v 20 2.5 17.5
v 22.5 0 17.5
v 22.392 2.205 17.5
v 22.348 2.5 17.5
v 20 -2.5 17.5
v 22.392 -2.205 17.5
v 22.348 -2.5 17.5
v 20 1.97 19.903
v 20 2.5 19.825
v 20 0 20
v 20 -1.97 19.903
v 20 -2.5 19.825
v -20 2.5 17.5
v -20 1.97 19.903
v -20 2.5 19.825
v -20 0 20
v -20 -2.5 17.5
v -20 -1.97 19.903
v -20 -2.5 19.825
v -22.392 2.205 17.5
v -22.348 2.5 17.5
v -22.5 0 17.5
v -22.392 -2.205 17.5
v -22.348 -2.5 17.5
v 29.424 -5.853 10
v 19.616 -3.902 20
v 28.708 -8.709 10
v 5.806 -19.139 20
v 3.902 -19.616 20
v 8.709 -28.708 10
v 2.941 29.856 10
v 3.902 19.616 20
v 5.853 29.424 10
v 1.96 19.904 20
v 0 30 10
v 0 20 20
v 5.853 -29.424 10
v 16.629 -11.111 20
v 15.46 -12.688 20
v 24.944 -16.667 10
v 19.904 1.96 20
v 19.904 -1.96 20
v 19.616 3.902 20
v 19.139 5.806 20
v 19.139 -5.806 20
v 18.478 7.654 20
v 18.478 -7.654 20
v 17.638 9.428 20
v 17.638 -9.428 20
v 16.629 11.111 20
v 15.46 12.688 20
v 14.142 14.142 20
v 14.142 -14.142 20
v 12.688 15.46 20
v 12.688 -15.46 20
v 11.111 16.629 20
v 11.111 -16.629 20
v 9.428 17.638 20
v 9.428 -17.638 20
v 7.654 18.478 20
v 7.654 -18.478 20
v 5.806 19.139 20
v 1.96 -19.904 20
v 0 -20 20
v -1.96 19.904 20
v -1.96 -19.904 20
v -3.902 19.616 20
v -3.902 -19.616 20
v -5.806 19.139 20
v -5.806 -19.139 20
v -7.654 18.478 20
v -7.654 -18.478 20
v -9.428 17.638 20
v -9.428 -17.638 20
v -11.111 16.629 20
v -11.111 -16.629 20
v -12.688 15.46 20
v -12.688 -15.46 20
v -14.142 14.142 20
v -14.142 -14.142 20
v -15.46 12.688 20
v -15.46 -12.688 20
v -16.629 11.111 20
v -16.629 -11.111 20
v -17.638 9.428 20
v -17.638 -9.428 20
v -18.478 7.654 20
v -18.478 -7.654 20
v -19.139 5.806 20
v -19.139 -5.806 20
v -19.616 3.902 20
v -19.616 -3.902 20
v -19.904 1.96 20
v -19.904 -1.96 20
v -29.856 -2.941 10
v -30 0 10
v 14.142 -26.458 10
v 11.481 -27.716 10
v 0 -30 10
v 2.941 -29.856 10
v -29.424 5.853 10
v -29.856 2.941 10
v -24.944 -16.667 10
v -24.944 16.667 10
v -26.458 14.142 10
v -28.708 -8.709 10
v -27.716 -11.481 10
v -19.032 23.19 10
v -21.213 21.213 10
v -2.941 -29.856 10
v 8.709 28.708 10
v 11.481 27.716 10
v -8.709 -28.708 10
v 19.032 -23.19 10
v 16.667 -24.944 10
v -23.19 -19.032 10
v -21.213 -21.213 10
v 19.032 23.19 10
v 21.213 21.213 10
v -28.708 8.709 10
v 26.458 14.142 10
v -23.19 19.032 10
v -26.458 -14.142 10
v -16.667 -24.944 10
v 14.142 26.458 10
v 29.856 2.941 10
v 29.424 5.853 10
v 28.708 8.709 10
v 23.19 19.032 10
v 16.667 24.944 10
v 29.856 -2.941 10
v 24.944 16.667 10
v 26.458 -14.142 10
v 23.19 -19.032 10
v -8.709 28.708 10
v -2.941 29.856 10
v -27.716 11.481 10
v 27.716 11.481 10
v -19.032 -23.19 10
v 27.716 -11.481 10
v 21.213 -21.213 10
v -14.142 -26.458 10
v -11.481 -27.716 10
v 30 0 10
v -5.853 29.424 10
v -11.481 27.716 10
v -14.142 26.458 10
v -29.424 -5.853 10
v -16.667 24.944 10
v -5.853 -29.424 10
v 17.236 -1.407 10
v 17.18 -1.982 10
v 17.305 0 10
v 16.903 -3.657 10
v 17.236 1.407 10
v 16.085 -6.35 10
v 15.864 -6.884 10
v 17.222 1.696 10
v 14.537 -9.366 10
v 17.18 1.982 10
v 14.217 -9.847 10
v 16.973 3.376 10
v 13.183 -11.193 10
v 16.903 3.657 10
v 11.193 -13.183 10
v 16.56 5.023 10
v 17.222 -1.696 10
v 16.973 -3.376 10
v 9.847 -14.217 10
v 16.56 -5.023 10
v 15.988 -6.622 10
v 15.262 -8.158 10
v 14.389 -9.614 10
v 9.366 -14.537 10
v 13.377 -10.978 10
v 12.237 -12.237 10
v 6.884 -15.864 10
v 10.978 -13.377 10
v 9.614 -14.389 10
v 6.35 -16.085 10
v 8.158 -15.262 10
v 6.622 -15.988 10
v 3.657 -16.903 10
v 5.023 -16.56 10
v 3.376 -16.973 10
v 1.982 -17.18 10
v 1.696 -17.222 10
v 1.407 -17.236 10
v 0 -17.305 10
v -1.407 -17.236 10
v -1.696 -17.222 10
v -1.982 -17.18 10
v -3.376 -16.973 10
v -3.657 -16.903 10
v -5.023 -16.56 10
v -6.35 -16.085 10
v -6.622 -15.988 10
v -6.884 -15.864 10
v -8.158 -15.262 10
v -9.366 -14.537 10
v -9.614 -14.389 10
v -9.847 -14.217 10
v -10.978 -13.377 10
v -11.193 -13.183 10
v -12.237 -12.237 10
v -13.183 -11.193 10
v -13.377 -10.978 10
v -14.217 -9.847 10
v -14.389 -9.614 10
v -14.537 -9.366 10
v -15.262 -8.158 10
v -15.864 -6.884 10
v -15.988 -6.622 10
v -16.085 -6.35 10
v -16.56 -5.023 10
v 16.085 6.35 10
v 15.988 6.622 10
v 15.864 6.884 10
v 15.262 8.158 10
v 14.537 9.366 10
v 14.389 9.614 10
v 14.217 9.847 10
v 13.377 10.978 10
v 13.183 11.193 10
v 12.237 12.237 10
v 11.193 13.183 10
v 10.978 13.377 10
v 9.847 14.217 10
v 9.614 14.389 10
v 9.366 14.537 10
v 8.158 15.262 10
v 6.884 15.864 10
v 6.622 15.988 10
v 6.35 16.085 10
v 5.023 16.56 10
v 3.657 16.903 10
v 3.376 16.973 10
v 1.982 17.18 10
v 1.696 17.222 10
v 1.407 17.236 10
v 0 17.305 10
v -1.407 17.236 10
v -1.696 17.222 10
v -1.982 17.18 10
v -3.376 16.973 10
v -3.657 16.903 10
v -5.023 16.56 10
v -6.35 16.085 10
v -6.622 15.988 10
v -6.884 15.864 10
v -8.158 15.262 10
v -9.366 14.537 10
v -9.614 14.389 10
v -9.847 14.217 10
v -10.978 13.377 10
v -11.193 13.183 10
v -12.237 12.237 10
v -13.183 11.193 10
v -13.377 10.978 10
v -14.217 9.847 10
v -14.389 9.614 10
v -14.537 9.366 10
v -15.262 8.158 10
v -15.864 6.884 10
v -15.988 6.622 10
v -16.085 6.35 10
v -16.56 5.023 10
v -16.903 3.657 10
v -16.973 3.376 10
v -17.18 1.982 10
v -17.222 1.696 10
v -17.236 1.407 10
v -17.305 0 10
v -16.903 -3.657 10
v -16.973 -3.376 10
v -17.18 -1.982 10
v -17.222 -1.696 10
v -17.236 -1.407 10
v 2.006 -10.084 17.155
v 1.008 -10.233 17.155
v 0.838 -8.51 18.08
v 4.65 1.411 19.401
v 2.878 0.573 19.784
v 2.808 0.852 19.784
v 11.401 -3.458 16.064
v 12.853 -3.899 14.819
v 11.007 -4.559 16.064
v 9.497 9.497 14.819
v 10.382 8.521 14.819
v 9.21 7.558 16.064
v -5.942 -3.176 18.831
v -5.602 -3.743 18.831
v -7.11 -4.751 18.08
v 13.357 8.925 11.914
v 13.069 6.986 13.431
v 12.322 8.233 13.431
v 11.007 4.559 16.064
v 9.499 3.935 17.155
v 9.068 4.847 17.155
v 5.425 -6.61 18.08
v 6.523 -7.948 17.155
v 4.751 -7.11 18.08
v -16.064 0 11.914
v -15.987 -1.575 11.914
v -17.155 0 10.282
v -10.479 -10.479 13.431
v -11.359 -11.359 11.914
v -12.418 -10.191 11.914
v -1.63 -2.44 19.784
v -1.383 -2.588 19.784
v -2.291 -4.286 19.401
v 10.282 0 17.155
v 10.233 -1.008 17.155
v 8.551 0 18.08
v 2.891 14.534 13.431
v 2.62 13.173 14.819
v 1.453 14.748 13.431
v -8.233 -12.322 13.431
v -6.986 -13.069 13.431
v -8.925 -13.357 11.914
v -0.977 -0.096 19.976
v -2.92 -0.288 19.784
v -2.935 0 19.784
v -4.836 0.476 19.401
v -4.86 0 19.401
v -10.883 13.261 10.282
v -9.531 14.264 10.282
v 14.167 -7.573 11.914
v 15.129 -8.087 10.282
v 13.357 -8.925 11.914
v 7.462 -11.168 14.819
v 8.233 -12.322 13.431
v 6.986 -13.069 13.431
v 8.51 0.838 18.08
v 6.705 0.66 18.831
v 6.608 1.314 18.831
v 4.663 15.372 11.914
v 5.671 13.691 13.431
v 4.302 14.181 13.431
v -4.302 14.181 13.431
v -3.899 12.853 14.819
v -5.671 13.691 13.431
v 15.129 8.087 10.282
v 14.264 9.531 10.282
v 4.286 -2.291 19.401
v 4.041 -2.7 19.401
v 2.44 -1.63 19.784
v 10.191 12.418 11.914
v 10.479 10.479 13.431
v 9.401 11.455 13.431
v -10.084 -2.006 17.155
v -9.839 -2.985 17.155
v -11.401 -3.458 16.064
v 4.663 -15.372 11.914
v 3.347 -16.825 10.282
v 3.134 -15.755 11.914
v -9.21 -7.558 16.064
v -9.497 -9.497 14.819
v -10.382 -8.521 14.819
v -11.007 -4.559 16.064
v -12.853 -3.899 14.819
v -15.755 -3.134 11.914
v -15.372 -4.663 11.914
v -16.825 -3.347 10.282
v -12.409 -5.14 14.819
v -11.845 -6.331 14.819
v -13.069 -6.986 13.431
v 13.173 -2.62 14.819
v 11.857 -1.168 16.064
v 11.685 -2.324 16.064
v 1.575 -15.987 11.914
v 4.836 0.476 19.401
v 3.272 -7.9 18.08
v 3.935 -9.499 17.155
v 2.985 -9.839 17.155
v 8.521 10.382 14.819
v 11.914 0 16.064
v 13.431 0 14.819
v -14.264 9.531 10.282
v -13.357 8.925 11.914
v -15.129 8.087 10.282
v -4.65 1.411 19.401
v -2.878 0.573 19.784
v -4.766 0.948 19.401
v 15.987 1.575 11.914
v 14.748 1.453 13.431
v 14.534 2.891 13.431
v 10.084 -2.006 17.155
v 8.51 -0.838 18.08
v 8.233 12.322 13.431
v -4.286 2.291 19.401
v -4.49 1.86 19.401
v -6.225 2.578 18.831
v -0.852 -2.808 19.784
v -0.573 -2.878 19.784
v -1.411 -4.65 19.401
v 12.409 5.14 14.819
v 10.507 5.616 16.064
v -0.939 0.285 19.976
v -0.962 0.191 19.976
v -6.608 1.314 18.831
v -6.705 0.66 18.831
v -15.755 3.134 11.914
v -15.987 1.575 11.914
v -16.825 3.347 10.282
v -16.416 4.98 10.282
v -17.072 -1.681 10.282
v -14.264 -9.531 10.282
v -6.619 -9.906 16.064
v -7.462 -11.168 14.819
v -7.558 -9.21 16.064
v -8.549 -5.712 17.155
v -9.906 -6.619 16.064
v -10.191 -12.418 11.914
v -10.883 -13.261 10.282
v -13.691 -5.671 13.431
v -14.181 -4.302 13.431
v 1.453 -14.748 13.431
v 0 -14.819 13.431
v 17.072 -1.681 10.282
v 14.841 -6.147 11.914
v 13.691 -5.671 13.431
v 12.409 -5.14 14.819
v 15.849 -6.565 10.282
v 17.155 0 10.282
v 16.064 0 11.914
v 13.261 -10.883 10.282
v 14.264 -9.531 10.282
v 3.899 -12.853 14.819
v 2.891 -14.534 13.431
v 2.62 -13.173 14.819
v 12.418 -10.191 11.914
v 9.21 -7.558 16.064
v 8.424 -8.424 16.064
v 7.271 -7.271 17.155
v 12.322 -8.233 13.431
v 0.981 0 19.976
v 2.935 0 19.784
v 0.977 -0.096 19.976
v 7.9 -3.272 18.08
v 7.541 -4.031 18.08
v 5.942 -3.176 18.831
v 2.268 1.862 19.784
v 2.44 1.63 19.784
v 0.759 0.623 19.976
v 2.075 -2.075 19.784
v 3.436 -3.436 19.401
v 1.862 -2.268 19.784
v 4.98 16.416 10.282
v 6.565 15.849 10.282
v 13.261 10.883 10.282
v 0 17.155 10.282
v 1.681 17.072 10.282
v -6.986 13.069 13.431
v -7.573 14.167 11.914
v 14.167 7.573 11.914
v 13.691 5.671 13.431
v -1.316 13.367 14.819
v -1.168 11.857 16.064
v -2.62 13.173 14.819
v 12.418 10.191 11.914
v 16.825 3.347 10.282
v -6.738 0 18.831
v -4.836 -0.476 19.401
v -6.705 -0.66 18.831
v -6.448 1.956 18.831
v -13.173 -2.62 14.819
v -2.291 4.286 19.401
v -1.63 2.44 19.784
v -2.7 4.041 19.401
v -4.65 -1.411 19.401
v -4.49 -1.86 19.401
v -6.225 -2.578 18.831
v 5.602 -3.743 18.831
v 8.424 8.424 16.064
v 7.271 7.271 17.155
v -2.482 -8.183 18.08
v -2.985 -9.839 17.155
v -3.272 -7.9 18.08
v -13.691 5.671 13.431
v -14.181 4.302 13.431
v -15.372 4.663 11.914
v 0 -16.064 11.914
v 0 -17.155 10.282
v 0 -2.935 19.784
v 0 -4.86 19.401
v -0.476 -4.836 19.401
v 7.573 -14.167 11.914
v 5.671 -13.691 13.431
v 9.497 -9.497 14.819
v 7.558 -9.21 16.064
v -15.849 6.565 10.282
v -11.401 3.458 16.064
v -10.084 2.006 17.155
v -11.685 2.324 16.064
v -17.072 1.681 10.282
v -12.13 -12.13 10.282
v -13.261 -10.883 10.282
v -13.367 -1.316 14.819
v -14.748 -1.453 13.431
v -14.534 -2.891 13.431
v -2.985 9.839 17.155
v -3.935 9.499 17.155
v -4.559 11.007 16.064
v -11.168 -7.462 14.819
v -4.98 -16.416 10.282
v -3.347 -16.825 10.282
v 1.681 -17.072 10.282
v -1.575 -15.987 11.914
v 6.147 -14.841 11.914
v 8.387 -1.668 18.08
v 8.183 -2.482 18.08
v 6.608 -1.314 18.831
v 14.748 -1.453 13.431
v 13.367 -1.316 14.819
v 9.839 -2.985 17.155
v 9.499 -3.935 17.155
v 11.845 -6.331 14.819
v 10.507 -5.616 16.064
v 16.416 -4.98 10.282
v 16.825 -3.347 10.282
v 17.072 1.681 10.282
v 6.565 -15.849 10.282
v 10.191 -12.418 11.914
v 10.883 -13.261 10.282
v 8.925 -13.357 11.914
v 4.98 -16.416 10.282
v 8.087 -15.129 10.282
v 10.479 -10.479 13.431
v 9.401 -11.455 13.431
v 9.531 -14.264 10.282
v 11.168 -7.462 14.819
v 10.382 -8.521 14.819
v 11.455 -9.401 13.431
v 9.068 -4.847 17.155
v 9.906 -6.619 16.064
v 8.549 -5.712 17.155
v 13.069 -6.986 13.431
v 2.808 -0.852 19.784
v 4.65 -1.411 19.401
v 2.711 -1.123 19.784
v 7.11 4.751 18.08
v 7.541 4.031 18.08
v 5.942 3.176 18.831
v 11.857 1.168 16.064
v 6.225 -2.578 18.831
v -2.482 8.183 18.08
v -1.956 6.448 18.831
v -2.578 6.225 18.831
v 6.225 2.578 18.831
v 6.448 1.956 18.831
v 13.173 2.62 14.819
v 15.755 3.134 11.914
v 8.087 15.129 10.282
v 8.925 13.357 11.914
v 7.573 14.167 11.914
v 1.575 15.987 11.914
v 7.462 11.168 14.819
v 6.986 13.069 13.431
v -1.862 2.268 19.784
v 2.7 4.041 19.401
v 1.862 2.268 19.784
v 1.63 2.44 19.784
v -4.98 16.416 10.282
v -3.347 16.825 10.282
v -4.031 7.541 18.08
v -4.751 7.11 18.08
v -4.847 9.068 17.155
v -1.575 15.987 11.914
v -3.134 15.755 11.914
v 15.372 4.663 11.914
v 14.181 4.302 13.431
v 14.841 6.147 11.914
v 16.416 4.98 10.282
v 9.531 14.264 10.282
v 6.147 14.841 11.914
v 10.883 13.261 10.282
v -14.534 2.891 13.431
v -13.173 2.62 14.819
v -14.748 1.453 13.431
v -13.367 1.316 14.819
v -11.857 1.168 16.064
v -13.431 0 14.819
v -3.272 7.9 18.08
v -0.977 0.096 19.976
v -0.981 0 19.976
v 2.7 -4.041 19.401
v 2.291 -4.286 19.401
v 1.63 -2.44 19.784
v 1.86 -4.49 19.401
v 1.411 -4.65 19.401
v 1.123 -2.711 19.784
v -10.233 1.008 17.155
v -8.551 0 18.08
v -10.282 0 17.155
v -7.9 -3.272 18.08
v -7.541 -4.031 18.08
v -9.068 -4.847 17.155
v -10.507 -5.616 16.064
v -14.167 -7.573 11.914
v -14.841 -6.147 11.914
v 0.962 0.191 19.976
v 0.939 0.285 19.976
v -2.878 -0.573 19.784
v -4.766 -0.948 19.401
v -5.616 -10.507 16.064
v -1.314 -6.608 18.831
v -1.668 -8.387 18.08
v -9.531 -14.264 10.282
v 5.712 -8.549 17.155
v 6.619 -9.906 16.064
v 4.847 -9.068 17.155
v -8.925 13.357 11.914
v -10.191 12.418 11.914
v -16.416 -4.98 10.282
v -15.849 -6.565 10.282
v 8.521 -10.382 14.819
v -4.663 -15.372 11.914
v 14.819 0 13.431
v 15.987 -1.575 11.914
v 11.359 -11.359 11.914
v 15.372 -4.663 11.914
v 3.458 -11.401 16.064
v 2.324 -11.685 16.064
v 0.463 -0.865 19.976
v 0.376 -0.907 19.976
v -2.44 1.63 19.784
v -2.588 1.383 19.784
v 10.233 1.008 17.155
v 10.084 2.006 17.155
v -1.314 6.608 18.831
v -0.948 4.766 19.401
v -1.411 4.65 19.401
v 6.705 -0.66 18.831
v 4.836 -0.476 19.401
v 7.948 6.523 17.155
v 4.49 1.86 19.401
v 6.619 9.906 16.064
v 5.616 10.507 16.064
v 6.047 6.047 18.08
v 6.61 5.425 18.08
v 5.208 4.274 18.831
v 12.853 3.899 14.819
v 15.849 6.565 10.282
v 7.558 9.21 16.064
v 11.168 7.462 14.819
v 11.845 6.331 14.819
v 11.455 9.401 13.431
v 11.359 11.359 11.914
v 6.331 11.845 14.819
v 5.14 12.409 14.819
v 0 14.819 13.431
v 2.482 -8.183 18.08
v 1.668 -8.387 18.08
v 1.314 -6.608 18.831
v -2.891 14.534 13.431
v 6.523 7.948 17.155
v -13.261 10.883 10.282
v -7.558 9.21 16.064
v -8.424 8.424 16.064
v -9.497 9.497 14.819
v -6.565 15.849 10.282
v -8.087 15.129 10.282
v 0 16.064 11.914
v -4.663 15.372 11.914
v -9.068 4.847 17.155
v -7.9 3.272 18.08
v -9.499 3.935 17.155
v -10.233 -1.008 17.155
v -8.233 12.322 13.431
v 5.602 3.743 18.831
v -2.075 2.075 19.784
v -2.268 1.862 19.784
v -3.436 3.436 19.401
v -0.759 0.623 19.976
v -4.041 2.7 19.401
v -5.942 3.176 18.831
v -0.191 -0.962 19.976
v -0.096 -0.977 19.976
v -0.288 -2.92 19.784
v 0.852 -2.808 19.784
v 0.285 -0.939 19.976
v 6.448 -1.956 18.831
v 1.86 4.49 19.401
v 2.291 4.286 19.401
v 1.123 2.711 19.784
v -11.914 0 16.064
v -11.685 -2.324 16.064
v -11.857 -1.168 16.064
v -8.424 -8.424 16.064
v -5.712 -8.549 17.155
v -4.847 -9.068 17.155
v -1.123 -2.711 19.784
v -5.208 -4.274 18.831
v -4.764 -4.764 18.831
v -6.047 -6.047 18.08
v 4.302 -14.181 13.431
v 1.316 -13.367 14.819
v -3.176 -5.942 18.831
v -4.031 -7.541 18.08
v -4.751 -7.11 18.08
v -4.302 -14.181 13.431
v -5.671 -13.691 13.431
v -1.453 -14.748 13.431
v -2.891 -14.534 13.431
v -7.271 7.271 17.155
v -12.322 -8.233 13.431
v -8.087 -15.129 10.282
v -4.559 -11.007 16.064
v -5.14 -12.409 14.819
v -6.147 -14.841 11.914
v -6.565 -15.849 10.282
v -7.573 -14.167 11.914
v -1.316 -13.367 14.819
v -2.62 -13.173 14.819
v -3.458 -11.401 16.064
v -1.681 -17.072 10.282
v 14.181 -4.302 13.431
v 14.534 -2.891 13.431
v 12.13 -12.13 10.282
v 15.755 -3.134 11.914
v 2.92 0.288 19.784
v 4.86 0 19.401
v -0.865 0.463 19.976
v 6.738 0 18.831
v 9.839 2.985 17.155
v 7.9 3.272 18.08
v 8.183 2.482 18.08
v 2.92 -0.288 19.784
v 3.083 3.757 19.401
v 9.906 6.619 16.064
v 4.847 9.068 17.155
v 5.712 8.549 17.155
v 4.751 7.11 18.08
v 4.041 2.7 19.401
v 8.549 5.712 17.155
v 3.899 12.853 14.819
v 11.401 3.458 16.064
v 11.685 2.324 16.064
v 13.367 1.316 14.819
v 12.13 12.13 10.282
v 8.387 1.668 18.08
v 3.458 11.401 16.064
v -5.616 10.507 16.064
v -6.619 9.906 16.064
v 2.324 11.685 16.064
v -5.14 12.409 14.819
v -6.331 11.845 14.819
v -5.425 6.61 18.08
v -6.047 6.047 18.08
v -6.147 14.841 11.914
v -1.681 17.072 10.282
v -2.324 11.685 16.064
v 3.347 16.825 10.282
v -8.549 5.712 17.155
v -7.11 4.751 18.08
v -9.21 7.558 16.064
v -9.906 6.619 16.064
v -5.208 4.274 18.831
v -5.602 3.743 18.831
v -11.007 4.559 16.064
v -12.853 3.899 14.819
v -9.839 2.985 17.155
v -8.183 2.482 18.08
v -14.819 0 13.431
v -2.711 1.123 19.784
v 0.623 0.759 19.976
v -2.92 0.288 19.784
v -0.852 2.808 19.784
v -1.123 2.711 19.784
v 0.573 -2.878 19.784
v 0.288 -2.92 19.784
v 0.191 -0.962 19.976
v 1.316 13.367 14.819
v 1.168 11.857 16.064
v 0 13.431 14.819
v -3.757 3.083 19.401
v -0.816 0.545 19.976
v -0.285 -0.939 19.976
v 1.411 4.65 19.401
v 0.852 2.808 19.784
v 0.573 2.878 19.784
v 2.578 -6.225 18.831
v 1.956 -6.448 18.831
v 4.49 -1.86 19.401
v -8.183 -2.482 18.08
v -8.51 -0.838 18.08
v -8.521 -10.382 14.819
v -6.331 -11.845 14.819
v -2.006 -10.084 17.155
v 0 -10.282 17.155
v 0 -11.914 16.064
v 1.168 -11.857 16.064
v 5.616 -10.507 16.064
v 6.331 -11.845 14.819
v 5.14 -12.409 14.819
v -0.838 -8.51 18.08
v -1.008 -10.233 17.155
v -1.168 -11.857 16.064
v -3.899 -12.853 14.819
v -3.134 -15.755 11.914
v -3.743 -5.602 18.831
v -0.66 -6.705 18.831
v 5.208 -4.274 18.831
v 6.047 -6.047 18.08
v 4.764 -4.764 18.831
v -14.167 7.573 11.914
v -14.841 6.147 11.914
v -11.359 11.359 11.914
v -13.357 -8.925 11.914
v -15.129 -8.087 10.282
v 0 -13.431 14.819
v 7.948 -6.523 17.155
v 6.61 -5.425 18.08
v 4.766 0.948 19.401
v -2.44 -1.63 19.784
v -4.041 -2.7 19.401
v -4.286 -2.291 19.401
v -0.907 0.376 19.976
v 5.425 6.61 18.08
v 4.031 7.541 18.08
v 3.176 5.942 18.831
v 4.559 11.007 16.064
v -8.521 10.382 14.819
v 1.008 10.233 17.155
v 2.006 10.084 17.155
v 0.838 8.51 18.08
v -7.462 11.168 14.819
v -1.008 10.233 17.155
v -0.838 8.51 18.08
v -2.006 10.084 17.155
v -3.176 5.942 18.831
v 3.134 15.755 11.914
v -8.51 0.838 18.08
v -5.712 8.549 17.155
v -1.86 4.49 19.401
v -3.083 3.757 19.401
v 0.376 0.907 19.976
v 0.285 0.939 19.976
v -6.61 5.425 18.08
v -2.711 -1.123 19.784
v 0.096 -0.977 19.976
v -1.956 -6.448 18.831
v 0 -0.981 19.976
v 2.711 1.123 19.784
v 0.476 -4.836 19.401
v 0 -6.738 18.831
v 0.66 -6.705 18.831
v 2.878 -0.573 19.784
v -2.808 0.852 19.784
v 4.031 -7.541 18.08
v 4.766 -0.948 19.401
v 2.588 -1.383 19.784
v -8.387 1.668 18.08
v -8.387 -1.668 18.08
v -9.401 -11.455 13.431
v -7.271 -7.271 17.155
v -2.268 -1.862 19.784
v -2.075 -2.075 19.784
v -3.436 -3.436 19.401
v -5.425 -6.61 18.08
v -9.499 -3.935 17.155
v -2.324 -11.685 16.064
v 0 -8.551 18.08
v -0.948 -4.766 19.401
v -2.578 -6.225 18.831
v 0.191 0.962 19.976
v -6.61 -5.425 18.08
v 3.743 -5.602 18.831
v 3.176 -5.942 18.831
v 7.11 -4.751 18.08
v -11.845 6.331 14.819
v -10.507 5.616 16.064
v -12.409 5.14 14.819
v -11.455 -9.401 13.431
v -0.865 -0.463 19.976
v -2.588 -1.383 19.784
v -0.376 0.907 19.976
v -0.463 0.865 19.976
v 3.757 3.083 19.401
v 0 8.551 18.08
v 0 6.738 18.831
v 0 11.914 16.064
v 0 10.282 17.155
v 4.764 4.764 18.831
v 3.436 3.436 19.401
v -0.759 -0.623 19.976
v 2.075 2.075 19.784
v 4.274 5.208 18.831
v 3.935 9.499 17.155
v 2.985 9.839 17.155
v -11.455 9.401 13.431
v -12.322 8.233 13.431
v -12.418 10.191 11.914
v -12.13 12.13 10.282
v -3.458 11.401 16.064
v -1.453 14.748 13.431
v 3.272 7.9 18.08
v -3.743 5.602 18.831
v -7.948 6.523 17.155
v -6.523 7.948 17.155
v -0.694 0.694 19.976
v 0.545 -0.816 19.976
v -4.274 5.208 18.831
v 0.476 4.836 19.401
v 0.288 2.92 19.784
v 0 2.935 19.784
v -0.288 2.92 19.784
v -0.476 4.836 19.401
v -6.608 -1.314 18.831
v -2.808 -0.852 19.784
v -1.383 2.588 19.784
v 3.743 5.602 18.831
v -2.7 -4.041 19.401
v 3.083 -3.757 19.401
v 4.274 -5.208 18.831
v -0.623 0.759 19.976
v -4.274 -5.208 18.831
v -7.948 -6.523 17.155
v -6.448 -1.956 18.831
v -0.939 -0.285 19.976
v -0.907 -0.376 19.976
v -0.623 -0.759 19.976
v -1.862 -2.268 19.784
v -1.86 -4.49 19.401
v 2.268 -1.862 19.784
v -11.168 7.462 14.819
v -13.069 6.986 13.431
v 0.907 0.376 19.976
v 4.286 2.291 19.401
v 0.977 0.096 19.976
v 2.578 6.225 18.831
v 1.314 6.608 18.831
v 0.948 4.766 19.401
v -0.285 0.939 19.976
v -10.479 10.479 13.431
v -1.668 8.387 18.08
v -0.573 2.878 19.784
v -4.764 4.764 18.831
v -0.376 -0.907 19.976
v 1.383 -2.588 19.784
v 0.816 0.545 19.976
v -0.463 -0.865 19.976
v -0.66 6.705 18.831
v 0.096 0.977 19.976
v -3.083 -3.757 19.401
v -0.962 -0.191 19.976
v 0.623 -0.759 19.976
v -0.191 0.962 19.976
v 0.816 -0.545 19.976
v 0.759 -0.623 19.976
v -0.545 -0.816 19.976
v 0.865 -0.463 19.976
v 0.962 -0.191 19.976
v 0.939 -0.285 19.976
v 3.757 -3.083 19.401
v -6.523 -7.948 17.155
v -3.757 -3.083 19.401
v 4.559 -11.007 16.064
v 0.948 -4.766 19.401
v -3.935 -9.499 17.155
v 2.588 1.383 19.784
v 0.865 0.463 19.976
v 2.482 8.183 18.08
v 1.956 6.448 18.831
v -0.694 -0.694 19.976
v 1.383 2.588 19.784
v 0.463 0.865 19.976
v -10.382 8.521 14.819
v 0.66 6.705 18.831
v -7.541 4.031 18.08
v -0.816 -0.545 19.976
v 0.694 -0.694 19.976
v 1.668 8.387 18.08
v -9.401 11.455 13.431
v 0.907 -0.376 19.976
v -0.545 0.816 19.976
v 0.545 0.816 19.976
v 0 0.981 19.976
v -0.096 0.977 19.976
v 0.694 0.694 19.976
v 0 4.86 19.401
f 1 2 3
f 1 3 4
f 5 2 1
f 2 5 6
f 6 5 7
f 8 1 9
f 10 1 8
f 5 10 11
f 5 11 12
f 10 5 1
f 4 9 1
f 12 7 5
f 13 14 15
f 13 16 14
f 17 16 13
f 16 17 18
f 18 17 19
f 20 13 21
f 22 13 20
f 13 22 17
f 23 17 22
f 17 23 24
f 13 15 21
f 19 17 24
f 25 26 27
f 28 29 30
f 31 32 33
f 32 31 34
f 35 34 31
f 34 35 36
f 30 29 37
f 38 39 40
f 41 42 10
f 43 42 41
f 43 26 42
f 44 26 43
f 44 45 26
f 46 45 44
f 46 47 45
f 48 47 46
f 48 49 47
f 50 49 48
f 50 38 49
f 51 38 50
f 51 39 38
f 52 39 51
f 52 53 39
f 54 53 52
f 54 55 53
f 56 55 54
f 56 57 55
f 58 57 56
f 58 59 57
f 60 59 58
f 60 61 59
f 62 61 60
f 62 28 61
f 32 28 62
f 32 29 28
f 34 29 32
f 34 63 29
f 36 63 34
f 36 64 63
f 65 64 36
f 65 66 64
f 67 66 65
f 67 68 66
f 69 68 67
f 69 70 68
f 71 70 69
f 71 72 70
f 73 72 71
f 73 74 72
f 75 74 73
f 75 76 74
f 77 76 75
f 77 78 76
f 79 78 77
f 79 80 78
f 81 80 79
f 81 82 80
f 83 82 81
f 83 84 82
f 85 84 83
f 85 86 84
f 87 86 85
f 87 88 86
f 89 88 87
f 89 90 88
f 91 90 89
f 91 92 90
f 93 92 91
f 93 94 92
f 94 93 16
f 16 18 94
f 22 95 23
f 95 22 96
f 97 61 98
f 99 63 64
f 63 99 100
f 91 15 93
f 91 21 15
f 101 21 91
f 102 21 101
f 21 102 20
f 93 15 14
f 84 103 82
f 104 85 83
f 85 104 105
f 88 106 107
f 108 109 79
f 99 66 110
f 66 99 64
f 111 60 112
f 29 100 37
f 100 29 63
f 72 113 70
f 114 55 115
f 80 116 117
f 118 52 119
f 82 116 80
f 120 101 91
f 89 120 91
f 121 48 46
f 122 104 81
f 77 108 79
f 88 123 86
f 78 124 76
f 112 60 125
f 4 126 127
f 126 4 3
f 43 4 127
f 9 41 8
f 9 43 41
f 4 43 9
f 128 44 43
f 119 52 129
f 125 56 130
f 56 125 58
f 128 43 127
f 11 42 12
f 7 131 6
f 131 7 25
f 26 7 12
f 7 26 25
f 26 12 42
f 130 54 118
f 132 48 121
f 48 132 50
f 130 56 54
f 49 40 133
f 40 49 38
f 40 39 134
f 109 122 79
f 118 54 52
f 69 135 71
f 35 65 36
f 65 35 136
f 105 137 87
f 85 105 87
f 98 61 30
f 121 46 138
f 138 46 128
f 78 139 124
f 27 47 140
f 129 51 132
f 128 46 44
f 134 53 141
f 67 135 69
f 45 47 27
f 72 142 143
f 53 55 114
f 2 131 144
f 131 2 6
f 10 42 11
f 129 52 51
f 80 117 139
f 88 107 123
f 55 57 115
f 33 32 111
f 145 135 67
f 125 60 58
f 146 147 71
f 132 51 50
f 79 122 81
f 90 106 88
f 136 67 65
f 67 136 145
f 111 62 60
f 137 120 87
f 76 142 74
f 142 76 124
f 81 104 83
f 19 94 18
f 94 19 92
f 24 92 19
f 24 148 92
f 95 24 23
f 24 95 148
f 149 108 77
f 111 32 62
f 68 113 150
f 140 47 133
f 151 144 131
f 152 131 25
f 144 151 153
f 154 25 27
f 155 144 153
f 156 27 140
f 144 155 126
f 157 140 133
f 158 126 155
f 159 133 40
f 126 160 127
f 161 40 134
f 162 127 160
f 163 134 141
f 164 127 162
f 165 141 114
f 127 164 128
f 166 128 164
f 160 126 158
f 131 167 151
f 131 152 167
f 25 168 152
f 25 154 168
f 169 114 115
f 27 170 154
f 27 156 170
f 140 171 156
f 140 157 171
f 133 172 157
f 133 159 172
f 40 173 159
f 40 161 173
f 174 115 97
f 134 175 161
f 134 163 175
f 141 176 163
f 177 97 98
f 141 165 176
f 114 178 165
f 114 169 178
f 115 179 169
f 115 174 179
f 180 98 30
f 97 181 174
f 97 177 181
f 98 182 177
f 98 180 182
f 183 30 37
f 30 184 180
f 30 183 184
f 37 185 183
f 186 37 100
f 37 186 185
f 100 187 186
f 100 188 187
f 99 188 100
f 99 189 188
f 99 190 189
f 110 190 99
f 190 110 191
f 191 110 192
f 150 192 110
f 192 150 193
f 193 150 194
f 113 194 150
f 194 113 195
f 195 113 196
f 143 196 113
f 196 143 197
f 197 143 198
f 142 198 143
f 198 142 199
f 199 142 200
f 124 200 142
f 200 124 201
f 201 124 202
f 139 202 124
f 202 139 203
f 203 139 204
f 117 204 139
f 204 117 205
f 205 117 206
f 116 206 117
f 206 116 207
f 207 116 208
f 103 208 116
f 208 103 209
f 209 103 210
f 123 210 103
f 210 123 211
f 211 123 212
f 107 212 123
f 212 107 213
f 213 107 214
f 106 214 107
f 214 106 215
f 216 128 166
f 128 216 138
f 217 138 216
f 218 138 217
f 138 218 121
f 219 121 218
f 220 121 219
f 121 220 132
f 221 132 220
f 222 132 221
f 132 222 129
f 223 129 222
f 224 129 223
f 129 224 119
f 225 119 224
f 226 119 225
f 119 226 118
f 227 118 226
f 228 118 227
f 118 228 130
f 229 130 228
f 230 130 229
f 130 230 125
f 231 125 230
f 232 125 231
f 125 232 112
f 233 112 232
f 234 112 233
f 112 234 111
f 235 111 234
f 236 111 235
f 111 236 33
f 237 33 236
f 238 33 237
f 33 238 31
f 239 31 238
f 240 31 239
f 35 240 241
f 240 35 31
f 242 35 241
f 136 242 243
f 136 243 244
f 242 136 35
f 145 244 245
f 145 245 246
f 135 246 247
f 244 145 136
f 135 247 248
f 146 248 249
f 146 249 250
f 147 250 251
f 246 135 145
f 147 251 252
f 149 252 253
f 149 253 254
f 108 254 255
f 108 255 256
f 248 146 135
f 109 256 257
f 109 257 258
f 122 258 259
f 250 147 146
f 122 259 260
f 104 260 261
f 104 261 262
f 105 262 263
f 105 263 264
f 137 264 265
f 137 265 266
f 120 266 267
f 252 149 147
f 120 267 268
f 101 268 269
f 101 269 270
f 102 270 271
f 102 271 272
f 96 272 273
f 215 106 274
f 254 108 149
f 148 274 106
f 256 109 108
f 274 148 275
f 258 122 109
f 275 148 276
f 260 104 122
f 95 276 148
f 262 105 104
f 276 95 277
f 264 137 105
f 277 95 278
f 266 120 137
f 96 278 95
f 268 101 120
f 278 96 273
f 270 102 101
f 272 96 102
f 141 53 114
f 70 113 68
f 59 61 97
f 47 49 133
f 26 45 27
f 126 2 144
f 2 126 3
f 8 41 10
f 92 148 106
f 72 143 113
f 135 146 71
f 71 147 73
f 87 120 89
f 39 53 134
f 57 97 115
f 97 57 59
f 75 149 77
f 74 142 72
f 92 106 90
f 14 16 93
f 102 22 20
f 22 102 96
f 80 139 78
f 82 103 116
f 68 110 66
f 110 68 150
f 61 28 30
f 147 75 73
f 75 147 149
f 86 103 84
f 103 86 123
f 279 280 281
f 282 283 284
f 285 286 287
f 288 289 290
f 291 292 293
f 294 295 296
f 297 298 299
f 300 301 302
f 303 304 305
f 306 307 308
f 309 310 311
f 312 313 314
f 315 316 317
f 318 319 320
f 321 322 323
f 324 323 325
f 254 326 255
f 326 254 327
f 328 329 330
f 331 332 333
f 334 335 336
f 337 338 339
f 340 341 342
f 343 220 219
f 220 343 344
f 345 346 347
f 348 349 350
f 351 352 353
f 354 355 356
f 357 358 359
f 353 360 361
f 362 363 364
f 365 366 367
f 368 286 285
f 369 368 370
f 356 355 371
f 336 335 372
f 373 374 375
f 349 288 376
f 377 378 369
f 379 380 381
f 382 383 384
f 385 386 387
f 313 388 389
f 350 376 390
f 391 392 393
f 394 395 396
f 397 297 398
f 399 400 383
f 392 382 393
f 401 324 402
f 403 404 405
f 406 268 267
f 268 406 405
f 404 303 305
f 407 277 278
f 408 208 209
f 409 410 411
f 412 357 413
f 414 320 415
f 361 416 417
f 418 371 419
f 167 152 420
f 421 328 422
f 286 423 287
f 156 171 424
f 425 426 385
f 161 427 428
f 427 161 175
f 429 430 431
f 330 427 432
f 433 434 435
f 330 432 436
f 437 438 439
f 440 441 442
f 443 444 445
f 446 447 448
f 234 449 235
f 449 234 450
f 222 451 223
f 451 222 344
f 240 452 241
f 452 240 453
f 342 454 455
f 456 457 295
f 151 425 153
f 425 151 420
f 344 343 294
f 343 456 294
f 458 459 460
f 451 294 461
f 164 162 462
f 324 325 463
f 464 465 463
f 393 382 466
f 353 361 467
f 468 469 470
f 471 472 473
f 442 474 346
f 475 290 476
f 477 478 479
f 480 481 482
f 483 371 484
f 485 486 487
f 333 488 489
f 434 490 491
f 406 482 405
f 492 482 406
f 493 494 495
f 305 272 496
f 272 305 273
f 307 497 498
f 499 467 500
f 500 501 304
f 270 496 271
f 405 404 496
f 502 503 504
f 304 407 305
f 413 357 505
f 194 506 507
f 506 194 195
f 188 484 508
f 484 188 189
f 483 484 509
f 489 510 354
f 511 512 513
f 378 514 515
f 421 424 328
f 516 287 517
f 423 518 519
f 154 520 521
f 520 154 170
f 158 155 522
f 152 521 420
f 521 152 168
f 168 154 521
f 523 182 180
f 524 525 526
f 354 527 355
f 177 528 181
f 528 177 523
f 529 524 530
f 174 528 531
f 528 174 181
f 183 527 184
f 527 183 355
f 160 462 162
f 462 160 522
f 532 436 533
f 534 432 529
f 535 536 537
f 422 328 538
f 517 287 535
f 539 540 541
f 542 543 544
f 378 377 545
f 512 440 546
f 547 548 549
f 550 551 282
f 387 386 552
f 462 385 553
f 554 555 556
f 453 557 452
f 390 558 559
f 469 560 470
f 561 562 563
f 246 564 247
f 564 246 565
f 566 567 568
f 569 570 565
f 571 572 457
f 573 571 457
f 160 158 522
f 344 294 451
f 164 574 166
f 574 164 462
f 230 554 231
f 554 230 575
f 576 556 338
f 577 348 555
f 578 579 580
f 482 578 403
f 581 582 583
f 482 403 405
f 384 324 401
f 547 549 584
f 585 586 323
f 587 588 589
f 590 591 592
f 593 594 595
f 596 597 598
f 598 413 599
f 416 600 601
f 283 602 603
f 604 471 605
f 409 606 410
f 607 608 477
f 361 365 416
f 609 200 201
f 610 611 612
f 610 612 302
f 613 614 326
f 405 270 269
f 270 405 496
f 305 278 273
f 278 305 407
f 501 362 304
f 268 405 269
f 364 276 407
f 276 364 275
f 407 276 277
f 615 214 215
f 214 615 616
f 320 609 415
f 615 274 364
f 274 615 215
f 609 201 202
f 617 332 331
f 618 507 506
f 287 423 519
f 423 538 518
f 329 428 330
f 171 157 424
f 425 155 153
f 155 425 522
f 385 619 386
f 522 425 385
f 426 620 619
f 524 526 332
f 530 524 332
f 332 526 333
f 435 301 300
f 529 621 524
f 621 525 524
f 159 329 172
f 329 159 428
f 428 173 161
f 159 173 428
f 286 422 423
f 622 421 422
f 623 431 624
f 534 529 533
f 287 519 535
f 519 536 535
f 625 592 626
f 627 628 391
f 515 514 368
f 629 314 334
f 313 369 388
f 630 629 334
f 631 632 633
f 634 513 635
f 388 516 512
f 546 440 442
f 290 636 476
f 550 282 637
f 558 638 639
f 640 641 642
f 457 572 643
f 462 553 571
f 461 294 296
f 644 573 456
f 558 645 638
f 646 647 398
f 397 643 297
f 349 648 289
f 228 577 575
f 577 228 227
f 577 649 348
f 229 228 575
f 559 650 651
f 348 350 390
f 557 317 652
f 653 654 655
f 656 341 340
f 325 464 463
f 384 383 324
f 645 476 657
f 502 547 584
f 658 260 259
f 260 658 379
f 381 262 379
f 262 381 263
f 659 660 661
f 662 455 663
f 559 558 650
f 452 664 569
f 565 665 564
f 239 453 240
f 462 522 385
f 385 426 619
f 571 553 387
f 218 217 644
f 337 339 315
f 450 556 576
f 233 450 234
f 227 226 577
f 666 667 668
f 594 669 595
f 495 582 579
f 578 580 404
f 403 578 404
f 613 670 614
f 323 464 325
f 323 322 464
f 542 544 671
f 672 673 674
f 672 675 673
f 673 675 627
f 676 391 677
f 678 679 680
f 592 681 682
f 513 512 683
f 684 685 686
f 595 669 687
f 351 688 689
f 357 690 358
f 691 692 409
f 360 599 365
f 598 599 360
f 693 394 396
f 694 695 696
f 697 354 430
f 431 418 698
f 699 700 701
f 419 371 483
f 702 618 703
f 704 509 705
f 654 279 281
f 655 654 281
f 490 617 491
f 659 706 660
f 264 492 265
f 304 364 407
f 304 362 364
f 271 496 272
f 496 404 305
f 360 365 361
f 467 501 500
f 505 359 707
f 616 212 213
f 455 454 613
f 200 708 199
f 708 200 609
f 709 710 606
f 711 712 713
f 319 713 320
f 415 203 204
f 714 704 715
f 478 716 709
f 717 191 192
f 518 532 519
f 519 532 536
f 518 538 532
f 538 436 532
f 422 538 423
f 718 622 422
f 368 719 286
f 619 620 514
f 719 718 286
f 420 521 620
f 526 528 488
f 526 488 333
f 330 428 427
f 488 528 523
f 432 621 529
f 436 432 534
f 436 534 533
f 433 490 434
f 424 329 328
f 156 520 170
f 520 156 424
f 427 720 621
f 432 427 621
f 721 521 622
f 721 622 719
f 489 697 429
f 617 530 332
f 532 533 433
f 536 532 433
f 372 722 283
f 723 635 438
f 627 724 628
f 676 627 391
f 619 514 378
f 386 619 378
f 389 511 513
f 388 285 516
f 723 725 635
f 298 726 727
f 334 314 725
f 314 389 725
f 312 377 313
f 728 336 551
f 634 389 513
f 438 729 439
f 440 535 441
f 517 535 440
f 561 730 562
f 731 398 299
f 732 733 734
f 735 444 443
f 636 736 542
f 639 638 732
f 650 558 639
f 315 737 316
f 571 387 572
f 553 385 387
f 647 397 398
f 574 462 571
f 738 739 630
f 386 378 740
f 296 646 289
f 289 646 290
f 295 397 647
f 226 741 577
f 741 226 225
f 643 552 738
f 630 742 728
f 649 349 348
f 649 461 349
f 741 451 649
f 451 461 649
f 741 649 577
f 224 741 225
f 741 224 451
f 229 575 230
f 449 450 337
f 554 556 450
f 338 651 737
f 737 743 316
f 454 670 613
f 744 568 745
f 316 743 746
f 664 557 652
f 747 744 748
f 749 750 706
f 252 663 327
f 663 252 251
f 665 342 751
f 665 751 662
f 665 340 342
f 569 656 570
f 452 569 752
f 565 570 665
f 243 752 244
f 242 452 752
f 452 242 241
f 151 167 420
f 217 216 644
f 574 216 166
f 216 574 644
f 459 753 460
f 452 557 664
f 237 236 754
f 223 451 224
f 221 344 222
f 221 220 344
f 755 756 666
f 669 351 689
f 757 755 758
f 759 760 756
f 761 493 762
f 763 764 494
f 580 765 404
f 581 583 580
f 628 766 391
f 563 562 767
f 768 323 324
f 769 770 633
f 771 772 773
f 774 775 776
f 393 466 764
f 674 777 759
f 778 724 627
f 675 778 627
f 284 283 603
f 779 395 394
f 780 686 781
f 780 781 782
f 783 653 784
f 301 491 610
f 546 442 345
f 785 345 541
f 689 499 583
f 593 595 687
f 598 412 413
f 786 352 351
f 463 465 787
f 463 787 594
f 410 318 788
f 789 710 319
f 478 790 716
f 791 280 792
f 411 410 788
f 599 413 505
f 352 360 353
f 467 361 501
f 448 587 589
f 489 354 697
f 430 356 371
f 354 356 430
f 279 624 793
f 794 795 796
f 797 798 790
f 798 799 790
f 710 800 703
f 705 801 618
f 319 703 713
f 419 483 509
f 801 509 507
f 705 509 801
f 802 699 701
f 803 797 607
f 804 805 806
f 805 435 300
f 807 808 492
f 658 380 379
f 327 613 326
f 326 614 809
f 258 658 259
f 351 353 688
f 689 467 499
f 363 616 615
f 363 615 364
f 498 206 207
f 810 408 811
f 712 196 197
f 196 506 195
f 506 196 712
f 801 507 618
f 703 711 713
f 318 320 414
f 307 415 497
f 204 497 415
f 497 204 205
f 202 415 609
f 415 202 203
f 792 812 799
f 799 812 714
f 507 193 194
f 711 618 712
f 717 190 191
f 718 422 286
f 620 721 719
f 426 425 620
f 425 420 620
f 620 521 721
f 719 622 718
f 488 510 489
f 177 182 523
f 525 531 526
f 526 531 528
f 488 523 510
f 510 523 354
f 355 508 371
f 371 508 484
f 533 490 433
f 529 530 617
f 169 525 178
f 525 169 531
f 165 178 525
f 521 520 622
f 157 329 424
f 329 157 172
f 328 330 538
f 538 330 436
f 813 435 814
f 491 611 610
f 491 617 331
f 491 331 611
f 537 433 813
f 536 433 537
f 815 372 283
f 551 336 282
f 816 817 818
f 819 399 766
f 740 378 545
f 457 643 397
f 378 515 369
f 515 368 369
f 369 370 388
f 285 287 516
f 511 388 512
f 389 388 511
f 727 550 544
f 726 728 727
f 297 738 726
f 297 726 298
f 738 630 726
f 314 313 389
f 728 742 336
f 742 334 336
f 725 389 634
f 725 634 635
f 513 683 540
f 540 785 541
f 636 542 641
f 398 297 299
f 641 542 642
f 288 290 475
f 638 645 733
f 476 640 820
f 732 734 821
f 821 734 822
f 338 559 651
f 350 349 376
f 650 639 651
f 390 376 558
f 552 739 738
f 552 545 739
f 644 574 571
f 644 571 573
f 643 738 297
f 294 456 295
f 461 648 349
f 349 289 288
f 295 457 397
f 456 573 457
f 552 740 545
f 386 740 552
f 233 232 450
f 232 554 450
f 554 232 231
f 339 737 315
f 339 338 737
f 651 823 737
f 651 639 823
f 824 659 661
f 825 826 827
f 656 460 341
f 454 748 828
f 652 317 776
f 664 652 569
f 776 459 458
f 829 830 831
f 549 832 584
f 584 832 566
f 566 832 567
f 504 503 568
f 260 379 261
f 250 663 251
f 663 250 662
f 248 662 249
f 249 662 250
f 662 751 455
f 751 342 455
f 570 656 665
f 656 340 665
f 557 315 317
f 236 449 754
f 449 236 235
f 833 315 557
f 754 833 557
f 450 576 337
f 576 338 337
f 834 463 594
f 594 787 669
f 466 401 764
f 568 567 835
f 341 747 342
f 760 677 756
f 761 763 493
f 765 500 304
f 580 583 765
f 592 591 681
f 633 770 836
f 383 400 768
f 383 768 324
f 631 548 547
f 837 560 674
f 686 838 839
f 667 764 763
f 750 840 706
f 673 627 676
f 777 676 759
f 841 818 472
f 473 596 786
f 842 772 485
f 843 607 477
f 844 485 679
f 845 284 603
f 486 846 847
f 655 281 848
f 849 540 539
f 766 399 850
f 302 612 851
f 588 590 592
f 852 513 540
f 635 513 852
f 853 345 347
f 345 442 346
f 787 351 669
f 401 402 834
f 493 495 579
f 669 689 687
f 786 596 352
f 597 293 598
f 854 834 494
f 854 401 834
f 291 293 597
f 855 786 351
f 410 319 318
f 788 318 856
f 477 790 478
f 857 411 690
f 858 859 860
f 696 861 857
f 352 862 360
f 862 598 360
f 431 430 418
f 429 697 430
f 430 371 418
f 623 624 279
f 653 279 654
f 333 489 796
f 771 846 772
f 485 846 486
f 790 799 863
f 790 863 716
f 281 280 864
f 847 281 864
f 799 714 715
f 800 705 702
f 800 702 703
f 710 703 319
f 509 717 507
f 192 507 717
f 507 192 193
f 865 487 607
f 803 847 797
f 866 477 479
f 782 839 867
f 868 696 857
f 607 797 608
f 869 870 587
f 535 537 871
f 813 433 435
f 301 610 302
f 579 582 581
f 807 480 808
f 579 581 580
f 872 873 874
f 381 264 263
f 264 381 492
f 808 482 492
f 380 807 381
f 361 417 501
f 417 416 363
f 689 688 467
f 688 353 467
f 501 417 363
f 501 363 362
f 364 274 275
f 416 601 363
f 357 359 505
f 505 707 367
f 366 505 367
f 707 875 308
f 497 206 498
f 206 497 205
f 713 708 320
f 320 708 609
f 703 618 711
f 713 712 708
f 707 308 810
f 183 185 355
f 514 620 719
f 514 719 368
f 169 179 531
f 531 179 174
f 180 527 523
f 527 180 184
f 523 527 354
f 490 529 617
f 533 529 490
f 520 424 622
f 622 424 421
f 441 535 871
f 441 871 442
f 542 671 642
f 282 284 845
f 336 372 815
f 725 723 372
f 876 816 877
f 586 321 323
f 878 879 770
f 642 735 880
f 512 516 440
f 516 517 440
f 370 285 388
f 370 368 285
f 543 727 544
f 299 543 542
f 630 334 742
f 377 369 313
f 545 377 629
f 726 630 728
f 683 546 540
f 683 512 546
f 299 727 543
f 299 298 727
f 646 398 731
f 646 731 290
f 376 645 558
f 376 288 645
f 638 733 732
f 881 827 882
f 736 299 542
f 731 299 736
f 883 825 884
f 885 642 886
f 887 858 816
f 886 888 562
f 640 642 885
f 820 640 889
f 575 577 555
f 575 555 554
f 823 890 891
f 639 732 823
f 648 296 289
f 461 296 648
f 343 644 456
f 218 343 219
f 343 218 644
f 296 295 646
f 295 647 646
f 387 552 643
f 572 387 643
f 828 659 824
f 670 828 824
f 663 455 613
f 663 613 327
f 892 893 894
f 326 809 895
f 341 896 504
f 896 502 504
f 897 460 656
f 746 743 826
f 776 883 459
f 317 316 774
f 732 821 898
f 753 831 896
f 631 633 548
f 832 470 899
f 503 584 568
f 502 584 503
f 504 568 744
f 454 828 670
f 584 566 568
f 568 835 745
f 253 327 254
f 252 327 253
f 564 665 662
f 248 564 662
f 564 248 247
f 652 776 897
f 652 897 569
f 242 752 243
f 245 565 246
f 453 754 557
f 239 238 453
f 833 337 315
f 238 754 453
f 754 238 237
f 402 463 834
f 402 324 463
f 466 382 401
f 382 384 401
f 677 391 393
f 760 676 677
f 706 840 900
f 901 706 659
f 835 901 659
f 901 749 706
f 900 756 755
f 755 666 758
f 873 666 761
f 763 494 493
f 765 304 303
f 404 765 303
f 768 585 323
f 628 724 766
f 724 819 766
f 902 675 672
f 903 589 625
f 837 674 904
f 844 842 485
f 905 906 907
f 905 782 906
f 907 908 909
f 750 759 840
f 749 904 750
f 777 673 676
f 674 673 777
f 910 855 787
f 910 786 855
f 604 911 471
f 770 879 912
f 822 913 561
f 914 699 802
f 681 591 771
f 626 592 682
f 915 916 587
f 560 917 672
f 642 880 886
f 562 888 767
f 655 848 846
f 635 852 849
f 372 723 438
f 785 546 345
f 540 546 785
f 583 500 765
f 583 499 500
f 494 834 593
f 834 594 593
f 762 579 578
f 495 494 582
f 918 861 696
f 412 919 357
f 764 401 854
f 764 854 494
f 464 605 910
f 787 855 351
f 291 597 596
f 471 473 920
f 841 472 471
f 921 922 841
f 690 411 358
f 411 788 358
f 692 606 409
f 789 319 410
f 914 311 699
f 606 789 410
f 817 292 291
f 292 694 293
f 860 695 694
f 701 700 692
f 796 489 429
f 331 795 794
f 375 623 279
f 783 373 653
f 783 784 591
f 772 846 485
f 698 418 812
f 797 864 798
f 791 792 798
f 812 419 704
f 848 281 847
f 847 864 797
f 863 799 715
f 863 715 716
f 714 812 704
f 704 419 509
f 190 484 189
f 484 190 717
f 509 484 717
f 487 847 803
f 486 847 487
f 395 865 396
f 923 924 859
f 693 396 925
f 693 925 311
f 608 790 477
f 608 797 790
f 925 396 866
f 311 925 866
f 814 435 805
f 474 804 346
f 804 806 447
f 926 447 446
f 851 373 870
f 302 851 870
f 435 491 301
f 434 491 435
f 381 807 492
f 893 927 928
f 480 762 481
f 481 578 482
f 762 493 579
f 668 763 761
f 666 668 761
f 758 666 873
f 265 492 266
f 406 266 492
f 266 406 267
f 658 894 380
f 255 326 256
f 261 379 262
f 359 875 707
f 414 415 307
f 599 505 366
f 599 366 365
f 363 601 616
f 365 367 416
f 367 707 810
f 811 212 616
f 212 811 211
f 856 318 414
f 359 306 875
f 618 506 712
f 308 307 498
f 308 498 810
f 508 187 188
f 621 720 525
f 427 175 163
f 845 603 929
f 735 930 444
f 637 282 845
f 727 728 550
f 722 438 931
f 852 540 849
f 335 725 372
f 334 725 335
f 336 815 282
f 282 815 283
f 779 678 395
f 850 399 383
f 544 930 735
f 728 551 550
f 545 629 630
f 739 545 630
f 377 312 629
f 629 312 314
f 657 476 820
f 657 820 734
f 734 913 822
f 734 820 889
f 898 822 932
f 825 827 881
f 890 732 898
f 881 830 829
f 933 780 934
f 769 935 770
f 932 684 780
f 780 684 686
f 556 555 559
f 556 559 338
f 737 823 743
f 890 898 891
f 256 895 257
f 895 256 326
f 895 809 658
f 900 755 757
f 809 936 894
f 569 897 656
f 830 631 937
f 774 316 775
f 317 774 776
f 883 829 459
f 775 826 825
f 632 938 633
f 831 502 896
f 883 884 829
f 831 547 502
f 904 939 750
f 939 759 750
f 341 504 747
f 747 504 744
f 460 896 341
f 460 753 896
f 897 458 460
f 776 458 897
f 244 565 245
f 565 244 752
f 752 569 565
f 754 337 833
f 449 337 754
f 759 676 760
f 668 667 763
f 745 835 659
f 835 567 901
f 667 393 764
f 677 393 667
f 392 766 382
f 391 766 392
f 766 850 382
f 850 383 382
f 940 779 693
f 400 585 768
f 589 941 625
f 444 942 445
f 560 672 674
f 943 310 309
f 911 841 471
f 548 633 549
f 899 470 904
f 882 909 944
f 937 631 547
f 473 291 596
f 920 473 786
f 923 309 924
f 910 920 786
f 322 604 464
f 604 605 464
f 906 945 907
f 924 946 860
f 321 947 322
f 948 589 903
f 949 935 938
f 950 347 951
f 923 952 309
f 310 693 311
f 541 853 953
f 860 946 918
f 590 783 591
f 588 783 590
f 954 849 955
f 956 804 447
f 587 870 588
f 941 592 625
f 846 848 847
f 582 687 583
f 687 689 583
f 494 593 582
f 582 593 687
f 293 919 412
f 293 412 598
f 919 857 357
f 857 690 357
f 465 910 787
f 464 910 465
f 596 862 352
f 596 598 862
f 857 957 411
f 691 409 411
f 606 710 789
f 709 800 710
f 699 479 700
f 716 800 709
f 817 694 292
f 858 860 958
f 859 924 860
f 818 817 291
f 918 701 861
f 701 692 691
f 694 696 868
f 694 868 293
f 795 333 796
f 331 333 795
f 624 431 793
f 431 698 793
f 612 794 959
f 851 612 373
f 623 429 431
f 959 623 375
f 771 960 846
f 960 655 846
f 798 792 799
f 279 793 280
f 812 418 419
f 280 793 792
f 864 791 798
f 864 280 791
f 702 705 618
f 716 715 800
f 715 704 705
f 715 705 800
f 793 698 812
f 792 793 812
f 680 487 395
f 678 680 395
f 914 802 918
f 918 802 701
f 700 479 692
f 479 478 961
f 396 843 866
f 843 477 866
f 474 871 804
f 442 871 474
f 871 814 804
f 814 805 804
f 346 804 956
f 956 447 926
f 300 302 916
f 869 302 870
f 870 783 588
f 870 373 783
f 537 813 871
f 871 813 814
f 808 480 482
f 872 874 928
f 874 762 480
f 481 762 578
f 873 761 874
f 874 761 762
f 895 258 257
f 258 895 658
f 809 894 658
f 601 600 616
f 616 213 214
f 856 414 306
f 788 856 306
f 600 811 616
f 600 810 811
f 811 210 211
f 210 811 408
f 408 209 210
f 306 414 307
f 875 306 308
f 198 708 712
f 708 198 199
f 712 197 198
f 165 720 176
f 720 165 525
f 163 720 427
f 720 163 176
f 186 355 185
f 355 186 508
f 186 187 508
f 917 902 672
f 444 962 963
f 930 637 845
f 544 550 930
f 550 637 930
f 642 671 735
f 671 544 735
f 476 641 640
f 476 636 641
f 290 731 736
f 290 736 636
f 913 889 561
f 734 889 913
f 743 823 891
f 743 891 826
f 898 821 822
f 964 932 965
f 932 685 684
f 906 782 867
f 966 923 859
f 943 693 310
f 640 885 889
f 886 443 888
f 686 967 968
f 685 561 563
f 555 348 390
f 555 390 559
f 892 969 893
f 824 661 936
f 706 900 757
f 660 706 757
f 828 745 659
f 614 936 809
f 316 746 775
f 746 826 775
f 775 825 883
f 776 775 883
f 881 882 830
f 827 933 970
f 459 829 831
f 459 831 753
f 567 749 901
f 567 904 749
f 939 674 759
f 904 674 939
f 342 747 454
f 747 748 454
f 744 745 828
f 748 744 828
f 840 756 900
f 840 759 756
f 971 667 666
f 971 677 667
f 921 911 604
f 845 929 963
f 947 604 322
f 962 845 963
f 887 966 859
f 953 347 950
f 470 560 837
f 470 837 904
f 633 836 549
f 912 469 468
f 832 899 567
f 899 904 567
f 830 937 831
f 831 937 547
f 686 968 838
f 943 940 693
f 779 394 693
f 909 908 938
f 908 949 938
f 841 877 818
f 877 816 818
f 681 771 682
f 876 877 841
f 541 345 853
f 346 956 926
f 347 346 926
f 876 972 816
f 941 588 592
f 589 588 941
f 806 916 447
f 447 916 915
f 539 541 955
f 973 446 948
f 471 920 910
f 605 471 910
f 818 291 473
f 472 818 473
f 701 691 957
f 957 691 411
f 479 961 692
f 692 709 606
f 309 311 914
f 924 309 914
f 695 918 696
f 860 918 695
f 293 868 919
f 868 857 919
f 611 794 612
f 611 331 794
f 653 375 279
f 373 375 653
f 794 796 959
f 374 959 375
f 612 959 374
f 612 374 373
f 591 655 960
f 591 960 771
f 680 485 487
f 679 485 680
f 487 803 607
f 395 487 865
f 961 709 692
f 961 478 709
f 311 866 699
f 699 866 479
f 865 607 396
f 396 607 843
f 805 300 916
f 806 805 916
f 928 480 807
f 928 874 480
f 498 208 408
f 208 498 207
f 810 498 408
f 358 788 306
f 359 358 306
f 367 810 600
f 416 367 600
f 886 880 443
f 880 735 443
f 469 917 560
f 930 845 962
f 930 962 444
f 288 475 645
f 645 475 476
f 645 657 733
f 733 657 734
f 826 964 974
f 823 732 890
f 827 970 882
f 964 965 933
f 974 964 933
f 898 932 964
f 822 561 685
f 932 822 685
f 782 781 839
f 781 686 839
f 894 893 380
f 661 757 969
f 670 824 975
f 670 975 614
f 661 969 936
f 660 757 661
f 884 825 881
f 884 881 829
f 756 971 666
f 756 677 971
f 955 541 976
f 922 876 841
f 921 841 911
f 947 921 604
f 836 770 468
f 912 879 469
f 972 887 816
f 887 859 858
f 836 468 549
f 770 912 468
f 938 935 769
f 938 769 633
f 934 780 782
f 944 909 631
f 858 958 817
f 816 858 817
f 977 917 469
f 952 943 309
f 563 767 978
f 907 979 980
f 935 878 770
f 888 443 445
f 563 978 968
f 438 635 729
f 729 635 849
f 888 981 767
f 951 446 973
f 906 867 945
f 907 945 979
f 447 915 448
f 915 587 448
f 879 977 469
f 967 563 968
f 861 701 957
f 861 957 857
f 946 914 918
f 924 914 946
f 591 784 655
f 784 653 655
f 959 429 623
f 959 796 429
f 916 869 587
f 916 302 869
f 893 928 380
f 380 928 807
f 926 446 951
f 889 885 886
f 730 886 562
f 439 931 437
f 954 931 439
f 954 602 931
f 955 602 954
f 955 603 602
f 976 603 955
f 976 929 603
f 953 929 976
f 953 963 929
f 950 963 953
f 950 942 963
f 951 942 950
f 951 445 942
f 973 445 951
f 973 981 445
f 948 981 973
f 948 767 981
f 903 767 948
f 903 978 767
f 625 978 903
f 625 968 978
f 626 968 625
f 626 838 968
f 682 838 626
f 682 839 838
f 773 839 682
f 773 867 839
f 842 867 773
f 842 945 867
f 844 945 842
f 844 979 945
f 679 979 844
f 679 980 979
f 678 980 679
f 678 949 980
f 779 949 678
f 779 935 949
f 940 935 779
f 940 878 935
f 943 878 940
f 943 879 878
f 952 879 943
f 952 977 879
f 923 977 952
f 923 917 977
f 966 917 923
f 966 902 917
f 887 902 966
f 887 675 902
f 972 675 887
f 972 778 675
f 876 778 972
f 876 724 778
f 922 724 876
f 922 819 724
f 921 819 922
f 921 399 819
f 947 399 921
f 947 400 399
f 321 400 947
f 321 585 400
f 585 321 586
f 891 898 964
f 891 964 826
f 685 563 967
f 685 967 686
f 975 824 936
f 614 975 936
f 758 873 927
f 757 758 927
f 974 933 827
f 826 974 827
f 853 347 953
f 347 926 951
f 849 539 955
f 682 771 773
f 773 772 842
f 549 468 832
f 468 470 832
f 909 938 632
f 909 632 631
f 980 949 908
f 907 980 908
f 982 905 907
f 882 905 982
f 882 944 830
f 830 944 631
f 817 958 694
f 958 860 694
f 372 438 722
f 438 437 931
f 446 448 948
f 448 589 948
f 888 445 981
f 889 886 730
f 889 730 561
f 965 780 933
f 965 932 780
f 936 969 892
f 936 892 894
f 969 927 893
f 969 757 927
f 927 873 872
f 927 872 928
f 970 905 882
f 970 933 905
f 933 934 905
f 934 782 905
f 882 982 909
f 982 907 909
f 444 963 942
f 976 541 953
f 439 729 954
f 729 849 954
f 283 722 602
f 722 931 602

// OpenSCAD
module faceted_bowl() {
    difference() {
        // Outer shape: truncated cone
        scale([1, 1, 0.5])
            cylinder(h=20, r1=30, r2=20, $fn=64);
        
        // Inner cavity: hemisphere
        translate([0, 0, -10])
            sphere(r=20, $fn=64);
        
        // Side notches
        for (angle = [0, 180]) {
            rotate([0, 0, angle])
                translate([25, 0, 10])
                    cube([10, 5, 5], center=true);
        }
    }
}

translate([0, 0, 10])
    faceted_bowl();
